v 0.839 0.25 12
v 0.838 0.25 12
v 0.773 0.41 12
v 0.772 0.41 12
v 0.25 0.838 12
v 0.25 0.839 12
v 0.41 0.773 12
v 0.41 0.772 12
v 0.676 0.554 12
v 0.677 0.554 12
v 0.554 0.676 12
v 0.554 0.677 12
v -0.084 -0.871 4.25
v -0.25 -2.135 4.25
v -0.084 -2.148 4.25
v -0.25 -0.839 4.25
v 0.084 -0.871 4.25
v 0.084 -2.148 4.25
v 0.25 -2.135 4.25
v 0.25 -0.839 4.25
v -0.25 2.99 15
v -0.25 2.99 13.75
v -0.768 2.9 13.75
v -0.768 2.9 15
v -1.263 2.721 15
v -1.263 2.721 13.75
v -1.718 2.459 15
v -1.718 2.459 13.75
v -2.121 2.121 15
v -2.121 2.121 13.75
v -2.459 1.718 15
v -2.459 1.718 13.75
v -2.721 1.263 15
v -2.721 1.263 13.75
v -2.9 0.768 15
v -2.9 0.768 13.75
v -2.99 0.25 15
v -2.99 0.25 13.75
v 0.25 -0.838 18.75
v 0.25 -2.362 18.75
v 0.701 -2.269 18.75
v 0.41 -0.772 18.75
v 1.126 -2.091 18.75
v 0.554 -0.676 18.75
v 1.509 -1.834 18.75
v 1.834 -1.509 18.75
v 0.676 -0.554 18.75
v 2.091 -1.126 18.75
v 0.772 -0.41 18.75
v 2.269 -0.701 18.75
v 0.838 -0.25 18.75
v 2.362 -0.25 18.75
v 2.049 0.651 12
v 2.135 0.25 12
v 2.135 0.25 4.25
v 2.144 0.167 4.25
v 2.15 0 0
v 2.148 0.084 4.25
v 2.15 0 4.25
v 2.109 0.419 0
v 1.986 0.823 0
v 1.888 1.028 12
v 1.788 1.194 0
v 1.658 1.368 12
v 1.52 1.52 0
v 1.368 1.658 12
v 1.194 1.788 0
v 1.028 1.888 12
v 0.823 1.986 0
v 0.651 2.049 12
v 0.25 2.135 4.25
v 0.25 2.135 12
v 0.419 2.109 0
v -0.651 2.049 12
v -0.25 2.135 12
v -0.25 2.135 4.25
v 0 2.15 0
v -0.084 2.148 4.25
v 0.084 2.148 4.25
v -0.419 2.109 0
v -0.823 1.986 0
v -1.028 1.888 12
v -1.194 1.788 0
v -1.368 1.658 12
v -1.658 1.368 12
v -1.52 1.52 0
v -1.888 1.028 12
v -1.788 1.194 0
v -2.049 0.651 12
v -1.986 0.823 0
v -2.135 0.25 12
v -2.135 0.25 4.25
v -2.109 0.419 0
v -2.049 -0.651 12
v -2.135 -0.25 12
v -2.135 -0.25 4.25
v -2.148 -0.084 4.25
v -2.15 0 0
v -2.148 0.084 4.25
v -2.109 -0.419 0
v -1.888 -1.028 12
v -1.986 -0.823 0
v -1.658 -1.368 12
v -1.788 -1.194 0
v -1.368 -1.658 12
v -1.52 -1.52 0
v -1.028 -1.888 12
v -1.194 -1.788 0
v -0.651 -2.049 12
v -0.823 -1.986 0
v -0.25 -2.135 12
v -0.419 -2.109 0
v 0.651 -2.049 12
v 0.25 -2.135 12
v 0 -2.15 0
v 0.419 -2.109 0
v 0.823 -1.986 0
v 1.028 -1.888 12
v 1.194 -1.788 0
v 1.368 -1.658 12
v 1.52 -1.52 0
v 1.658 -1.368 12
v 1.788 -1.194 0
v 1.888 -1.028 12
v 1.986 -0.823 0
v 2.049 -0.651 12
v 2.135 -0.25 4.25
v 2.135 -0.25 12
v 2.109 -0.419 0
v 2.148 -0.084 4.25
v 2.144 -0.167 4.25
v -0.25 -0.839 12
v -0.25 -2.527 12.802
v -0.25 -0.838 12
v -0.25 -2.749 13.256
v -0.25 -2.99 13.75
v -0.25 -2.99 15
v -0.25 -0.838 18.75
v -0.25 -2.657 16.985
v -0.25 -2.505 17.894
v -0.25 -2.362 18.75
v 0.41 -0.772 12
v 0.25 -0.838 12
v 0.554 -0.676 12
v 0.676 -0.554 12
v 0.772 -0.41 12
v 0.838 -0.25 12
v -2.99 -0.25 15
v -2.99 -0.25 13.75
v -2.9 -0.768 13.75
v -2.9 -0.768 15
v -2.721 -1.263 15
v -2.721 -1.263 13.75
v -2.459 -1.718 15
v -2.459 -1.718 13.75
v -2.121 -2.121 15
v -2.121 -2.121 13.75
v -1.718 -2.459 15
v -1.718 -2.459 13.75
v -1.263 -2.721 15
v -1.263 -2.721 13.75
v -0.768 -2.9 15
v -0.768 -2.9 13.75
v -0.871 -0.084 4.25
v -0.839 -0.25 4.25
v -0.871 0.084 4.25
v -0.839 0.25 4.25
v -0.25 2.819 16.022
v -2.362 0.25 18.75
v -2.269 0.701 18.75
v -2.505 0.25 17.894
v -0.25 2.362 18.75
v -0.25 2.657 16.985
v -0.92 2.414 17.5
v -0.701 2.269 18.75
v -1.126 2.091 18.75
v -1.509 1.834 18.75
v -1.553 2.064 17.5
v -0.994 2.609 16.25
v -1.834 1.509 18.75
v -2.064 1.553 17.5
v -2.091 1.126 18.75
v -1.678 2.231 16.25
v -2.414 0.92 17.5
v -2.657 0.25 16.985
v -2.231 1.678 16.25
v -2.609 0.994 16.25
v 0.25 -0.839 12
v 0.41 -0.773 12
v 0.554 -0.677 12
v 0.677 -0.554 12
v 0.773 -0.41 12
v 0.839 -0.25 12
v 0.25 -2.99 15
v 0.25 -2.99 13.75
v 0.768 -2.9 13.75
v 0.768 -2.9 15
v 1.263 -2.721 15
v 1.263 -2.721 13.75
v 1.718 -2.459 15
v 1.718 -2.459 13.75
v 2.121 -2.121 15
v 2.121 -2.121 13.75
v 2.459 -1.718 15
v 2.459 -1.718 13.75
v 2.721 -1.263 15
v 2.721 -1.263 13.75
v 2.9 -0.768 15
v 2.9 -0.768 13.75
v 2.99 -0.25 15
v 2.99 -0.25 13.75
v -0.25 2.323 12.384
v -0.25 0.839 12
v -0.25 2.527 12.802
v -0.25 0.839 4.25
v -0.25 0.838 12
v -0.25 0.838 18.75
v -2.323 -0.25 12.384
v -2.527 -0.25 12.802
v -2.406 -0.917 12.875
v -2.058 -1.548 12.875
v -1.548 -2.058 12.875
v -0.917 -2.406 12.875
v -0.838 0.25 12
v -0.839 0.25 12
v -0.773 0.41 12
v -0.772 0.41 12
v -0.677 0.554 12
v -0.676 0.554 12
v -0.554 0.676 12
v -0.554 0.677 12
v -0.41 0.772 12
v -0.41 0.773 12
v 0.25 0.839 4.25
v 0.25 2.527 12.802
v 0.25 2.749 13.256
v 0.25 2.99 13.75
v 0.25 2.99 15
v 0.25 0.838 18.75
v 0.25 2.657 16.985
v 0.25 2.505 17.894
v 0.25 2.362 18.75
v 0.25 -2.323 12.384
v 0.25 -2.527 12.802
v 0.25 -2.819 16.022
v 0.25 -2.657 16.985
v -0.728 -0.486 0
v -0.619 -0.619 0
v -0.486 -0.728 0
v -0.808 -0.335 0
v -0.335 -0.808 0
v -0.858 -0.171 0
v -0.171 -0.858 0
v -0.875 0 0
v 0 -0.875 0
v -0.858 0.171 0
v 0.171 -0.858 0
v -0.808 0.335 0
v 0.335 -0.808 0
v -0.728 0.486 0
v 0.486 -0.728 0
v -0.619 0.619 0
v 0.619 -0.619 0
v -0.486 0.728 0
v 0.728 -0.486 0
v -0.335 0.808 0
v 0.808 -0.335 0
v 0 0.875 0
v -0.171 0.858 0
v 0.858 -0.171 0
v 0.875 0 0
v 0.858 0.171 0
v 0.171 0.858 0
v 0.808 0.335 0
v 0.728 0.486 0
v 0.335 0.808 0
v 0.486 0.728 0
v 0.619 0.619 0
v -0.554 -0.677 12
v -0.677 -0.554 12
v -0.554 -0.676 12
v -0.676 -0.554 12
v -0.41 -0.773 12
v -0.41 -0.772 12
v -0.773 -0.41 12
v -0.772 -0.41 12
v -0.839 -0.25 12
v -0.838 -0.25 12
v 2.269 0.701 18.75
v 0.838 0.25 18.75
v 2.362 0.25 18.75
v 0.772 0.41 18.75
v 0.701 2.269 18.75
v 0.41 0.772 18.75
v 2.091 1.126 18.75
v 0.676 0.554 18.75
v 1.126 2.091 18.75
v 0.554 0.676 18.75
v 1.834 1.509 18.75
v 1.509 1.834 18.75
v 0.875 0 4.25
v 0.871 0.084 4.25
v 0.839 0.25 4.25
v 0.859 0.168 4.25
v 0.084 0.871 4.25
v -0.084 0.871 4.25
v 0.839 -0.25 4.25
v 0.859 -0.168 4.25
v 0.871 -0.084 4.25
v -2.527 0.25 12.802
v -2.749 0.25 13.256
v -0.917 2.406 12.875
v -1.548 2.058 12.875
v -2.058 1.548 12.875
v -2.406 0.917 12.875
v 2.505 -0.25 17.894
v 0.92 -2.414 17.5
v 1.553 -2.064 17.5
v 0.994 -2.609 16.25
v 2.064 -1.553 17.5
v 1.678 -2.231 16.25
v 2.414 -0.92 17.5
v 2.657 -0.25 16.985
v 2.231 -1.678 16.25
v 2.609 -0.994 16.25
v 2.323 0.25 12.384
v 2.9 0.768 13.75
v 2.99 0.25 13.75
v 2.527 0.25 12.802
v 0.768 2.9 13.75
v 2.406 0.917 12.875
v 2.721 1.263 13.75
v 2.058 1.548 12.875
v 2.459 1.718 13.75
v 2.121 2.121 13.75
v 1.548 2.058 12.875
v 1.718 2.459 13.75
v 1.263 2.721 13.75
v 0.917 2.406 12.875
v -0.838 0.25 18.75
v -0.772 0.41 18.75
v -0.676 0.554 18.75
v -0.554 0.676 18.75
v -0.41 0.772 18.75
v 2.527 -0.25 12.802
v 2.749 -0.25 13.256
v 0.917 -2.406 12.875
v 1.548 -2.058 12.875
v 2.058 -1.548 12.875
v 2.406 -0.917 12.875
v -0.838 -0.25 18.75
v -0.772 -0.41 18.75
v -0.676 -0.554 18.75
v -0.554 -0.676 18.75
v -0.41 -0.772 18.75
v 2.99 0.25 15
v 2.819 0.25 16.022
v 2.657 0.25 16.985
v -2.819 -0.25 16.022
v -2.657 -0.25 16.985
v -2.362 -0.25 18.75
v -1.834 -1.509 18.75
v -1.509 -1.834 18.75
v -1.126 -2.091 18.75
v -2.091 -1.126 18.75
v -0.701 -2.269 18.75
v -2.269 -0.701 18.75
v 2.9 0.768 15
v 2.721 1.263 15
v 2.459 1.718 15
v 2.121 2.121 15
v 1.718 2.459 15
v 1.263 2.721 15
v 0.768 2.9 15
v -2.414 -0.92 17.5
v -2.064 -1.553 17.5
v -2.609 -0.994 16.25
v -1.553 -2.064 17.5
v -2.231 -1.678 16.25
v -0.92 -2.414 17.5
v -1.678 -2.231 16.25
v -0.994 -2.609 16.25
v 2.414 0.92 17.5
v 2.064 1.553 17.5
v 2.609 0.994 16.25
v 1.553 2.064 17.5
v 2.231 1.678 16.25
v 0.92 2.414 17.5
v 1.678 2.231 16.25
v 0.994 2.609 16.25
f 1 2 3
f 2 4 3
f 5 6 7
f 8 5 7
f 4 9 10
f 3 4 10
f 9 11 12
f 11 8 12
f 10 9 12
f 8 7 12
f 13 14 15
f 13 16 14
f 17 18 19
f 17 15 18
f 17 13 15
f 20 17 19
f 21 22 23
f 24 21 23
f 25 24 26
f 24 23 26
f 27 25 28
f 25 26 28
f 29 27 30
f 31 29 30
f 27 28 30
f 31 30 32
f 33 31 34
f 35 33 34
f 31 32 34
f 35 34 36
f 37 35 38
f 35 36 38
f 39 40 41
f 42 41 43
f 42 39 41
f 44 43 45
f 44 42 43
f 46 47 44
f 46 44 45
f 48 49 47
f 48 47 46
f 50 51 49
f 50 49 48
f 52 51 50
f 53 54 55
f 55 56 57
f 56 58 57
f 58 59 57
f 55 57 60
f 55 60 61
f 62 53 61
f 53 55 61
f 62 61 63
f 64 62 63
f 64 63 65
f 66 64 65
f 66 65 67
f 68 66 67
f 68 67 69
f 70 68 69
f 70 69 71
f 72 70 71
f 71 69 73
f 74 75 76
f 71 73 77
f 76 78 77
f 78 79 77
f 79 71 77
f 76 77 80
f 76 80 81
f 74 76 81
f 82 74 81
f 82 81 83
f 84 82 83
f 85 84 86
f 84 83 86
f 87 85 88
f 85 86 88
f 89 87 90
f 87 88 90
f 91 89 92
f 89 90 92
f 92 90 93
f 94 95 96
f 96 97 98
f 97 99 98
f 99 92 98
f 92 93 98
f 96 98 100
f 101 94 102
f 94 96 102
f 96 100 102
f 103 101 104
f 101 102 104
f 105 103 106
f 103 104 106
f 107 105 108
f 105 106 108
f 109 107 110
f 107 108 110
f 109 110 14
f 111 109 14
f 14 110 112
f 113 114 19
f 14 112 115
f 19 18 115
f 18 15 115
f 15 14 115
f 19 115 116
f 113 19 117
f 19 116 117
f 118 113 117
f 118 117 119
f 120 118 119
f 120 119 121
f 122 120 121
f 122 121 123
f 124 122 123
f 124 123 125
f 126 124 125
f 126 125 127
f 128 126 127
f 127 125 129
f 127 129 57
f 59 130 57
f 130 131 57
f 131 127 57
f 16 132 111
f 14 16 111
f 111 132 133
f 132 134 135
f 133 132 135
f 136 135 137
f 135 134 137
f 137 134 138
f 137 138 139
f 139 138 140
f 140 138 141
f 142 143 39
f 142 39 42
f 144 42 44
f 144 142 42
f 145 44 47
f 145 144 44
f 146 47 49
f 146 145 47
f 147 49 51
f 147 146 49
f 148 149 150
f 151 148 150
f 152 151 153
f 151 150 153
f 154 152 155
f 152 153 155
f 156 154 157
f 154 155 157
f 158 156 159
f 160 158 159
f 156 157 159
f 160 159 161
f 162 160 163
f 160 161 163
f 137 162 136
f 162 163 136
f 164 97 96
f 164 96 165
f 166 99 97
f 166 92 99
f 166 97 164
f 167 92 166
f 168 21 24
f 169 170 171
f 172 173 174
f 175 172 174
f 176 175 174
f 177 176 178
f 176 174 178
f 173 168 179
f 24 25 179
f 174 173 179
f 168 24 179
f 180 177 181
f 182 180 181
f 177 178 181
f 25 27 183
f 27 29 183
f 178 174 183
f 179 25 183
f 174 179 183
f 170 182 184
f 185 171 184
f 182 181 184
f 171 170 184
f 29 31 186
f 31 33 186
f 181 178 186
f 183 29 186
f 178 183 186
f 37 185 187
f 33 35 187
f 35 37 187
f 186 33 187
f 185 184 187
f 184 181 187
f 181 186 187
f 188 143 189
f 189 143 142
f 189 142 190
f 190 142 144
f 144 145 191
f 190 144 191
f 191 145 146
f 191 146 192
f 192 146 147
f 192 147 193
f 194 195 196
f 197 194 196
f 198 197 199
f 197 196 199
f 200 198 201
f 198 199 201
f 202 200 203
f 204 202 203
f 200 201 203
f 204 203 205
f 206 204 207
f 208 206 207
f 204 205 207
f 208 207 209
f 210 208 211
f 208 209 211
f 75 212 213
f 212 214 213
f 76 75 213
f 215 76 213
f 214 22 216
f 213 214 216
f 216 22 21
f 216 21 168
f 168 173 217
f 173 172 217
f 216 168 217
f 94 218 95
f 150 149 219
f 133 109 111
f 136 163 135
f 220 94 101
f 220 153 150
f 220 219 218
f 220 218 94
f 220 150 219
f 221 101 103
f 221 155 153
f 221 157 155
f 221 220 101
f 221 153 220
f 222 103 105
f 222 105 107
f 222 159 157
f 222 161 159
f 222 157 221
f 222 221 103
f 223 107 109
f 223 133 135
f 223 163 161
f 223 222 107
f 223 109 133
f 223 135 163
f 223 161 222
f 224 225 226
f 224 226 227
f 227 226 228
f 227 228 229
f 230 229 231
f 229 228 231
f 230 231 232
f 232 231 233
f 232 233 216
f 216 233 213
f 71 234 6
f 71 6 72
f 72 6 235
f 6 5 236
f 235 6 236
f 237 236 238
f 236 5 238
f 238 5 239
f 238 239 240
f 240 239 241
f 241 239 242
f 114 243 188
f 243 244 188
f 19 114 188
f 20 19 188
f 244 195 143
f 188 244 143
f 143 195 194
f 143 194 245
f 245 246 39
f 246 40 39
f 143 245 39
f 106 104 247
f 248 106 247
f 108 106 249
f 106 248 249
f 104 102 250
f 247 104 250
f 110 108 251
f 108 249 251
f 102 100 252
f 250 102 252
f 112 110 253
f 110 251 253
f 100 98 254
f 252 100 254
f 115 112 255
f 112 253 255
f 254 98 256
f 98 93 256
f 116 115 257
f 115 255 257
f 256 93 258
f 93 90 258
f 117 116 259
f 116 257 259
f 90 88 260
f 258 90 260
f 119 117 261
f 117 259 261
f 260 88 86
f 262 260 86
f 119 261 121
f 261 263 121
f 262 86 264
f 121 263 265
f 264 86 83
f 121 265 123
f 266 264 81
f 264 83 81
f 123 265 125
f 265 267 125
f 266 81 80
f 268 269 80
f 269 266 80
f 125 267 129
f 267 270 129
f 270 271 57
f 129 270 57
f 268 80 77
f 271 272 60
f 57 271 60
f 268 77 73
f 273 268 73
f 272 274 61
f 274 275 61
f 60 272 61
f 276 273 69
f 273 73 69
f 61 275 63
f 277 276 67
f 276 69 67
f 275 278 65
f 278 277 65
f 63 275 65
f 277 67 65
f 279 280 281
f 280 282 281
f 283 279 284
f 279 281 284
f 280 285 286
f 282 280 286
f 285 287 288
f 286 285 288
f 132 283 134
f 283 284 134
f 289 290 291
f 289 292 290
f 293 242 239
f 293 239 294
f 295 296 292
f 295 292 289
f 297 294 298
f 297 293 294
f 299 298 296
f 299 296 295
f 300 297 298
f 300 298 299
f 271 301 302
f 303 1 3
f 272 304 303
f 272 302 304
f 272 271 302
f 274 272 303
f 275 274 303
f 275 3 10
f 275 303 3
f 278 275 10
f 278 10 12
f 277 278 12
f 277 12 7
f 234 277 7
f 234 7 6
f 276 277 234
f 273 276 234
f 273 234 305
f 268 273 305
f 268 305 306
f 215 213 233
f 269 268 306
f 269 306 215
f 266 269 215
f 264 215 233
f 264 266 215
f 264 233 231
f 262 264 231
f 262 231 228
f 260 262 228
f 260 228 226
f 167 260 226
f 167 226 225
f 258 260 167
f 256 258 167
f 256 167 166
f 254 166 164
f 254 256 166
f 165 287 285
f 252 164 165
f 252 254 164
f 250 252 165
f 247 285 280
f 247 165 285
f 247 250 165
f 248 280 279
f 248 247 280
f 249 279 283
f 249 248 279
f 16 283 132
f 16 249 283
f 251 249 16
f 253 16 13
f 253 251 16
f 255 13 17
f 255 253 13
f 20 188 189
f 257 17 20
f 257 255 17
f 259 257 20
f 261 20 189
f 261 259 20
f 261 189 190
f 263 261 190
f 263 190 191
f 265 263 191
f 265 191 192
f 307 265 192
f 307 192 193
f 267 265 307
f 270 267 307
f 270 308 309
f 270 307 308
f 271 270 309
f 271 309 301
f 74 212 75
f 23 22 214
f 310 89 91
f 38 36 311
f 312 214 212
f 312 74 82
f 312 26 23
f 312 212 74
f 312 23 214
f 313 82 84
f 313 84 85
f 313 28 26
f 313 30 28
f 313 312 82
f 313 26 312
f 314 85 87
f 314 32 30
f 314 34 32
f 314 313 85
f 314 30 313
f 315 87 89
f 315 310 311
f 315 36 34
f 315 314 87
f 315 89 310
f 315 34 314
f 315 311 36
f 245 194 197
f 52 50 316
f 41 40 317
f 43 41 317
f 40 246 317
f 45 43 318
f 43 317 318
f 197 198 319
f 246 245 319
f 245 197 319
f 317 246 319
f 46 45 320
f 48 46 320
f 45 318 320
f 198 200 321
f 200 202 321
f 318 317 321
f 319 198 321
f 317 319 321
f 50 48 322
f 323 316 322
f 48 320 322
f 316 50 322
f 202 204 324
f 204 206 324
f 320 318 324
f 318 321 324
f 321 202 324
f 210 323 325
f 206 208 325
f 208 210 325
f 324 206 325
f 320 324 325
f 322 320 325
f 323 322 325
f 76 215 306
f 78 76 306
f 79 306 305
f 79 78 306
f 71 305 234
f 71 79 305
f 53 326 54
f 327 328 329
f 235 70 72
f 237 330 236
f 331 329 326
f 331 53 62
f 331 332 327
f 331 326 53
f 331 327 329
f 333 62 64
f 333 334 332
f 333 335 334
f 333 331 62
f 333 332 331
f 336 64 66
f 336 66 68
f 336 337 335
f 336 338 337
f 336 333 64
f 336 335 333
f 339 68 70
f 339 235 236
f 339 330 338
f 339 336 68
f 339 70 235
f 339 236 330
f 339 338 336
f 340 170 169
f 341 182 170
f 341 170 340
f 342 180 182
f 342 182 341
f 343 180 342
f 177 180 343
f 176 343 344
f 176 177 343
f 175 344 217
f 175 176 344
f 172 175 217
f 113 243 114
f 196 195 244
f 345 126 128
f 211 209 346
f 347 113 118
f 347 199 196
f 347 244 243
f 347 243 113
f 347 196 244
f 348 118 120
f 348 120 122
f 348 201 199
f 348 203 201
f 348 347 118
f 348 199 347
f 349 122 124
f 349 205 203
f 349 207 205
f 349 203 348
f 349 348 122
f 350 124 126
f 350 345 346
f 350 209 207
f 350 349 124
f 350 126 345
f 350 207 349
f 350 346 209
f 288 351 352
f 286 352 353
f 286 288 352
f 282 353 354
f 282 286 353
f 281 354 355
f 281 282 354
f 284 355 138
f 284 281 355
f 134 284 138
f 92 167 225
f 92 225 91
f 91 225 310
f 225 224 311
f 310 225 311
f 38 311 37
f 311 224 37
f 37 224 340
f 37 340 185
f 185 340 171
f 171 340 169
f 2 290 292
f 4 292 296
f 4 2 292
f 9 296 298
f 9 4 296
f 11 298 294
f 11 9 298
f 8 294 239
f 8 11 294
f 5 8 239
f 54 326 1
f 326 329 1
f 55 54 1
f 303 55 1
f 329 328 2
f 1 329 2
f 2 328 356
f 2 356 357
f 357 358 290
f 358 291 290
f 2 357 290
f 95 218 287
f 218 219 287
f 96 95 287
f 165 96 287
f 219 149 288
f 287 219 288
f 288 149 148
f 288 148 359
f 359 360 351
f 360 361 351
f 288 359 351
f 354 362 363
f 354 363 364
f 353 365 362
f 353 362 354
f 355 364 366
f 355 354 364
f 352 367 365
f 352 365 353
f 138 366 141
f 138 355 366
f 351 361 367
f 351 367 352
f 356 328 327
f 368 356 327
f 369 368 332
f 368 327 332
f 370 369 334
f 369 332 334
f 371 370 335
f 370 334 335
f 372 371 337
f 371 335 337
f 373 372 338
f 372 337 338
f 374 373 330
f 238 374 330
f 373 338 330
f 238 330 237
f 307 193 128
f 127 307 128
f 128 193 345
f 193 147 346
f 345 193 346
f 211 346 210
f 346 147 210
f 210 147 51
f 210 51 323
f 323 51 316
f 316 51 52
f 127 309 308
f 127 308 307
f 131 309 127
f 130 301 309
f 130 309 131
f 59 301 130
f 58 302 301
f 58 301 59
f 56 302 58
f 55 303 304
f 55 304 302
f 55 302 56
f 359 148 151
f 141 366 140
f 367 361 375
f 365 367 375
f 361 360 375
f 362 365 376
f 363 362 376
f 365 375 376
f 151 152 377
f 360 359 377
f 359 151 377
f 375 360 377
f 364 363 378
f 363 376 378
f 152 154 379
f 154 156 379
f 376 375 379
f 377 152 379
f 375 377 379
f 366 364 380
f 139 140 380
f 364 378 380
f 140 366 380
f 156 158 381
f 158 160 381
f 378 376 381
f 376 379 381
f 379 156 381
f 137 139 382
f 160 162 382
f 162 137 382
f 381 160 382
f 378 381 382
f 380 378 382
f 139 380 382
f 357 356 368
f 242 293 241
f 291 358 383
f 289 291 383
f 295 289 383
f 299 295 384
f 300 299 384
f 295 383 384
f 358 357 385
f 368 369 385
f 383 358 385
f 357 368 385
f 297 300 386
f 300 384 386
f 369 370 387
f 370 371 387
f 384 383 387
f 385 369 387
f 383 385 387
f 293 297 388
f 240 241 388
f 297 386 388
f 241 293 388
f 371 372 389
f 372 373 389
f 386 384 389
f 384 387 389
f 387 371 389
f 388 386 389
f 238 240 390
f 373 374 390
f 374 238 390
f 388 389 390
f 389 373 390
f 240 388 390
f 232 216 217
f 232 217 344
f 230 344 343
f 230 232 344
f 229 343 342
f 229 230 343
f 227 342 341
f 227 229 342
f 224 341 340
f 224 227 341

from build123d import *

# Parameters (mm, degrees)
SKETCH1_R           = 2.15
SKETCH1_R_2         = 0.875
BOSS_EXTRUDE1_DEPTH = 12
SKETCH2_R           = 3
SKETCH2_R_2         = 0.874277104
BOSS_EXTRUDE2_DEPTH = 6.75
CUT_EXTRUDE1_DEPTH  = 14.5


with BuildPart() as part:
    # Sketch1 → Boss-Extrude1 (new body)
    with BuildSketch(Plane.XY):
        Circle(SKETCH1_R)
        Circle(SKETCH1_R_2, mode=Mode.SUBTRACT)
    extrude(amount=BOSS_EXTRUDE1_DEPTH)

    # Sketch2 → Boss-Extrude2 (add)
    with BuildSketch(Plane.XY.offset(12)):
        Circle(SKETCH2_R)
        Circle(SKETCH2_R_2, mode=Mode.SUBTRACT)
    extrude(amount=BOSS_EXTRUDE2_DEPTH)

    # Sketch3 → Cut-Revolve1 (revolve, cut)
    with BuildSketch(Plane(origin=(0, 0, 0), x_dir=(1, 0, 0), z_dir=(0, 1, 0))):
        Polygon((2.15, -12), (3, -13.75), (4.254862661, -13.125400589), (3.126580546, -11.371696522), align=None)
        Polygon((2.375, -18.75), (3, -15), (5.751760011, -16.421813113), (4.254862661, -20.939605223), align=None)
    revolve(axis=Axis((0, 0, 0), (0, 0, 1)), mode=Mode.SUBTRACT)

    # Sketch4 → Cut-Extrude1 (cut)
    with BuildSketch(Plane.XY.offset(18.75)):
        Polygon((0, 3.340763125), (-0.25, 3.340763125), (-0.25, 0.464842209), (0.25, 0.464842209), (0.25, 3.340763125), align=None)
        Polygon((3.340763125, 0), (3.340763125, 0.25), (0.464842209, 0.25), (0.464842209, -0.25), (3.340763125, -0.25), align=None)
        Polygon((0, -3.340763125), (0.25, -3.340763125), (0.25, -0.464842209), (-0.25, -0.464842209), (-0.25, -3.340763125), align=None)
        Polygon((-3.340763125, 0), (-3.340763125, -0.25), (-0.464842209, -0.25), (-0.464842209, 0.25), (-3.340763125, 0.25), align=None)
    extrude(amount=-CUT_EXTRUDE1_DEPTH, mode=Mode.SUBTRACT)


solid = part.part
